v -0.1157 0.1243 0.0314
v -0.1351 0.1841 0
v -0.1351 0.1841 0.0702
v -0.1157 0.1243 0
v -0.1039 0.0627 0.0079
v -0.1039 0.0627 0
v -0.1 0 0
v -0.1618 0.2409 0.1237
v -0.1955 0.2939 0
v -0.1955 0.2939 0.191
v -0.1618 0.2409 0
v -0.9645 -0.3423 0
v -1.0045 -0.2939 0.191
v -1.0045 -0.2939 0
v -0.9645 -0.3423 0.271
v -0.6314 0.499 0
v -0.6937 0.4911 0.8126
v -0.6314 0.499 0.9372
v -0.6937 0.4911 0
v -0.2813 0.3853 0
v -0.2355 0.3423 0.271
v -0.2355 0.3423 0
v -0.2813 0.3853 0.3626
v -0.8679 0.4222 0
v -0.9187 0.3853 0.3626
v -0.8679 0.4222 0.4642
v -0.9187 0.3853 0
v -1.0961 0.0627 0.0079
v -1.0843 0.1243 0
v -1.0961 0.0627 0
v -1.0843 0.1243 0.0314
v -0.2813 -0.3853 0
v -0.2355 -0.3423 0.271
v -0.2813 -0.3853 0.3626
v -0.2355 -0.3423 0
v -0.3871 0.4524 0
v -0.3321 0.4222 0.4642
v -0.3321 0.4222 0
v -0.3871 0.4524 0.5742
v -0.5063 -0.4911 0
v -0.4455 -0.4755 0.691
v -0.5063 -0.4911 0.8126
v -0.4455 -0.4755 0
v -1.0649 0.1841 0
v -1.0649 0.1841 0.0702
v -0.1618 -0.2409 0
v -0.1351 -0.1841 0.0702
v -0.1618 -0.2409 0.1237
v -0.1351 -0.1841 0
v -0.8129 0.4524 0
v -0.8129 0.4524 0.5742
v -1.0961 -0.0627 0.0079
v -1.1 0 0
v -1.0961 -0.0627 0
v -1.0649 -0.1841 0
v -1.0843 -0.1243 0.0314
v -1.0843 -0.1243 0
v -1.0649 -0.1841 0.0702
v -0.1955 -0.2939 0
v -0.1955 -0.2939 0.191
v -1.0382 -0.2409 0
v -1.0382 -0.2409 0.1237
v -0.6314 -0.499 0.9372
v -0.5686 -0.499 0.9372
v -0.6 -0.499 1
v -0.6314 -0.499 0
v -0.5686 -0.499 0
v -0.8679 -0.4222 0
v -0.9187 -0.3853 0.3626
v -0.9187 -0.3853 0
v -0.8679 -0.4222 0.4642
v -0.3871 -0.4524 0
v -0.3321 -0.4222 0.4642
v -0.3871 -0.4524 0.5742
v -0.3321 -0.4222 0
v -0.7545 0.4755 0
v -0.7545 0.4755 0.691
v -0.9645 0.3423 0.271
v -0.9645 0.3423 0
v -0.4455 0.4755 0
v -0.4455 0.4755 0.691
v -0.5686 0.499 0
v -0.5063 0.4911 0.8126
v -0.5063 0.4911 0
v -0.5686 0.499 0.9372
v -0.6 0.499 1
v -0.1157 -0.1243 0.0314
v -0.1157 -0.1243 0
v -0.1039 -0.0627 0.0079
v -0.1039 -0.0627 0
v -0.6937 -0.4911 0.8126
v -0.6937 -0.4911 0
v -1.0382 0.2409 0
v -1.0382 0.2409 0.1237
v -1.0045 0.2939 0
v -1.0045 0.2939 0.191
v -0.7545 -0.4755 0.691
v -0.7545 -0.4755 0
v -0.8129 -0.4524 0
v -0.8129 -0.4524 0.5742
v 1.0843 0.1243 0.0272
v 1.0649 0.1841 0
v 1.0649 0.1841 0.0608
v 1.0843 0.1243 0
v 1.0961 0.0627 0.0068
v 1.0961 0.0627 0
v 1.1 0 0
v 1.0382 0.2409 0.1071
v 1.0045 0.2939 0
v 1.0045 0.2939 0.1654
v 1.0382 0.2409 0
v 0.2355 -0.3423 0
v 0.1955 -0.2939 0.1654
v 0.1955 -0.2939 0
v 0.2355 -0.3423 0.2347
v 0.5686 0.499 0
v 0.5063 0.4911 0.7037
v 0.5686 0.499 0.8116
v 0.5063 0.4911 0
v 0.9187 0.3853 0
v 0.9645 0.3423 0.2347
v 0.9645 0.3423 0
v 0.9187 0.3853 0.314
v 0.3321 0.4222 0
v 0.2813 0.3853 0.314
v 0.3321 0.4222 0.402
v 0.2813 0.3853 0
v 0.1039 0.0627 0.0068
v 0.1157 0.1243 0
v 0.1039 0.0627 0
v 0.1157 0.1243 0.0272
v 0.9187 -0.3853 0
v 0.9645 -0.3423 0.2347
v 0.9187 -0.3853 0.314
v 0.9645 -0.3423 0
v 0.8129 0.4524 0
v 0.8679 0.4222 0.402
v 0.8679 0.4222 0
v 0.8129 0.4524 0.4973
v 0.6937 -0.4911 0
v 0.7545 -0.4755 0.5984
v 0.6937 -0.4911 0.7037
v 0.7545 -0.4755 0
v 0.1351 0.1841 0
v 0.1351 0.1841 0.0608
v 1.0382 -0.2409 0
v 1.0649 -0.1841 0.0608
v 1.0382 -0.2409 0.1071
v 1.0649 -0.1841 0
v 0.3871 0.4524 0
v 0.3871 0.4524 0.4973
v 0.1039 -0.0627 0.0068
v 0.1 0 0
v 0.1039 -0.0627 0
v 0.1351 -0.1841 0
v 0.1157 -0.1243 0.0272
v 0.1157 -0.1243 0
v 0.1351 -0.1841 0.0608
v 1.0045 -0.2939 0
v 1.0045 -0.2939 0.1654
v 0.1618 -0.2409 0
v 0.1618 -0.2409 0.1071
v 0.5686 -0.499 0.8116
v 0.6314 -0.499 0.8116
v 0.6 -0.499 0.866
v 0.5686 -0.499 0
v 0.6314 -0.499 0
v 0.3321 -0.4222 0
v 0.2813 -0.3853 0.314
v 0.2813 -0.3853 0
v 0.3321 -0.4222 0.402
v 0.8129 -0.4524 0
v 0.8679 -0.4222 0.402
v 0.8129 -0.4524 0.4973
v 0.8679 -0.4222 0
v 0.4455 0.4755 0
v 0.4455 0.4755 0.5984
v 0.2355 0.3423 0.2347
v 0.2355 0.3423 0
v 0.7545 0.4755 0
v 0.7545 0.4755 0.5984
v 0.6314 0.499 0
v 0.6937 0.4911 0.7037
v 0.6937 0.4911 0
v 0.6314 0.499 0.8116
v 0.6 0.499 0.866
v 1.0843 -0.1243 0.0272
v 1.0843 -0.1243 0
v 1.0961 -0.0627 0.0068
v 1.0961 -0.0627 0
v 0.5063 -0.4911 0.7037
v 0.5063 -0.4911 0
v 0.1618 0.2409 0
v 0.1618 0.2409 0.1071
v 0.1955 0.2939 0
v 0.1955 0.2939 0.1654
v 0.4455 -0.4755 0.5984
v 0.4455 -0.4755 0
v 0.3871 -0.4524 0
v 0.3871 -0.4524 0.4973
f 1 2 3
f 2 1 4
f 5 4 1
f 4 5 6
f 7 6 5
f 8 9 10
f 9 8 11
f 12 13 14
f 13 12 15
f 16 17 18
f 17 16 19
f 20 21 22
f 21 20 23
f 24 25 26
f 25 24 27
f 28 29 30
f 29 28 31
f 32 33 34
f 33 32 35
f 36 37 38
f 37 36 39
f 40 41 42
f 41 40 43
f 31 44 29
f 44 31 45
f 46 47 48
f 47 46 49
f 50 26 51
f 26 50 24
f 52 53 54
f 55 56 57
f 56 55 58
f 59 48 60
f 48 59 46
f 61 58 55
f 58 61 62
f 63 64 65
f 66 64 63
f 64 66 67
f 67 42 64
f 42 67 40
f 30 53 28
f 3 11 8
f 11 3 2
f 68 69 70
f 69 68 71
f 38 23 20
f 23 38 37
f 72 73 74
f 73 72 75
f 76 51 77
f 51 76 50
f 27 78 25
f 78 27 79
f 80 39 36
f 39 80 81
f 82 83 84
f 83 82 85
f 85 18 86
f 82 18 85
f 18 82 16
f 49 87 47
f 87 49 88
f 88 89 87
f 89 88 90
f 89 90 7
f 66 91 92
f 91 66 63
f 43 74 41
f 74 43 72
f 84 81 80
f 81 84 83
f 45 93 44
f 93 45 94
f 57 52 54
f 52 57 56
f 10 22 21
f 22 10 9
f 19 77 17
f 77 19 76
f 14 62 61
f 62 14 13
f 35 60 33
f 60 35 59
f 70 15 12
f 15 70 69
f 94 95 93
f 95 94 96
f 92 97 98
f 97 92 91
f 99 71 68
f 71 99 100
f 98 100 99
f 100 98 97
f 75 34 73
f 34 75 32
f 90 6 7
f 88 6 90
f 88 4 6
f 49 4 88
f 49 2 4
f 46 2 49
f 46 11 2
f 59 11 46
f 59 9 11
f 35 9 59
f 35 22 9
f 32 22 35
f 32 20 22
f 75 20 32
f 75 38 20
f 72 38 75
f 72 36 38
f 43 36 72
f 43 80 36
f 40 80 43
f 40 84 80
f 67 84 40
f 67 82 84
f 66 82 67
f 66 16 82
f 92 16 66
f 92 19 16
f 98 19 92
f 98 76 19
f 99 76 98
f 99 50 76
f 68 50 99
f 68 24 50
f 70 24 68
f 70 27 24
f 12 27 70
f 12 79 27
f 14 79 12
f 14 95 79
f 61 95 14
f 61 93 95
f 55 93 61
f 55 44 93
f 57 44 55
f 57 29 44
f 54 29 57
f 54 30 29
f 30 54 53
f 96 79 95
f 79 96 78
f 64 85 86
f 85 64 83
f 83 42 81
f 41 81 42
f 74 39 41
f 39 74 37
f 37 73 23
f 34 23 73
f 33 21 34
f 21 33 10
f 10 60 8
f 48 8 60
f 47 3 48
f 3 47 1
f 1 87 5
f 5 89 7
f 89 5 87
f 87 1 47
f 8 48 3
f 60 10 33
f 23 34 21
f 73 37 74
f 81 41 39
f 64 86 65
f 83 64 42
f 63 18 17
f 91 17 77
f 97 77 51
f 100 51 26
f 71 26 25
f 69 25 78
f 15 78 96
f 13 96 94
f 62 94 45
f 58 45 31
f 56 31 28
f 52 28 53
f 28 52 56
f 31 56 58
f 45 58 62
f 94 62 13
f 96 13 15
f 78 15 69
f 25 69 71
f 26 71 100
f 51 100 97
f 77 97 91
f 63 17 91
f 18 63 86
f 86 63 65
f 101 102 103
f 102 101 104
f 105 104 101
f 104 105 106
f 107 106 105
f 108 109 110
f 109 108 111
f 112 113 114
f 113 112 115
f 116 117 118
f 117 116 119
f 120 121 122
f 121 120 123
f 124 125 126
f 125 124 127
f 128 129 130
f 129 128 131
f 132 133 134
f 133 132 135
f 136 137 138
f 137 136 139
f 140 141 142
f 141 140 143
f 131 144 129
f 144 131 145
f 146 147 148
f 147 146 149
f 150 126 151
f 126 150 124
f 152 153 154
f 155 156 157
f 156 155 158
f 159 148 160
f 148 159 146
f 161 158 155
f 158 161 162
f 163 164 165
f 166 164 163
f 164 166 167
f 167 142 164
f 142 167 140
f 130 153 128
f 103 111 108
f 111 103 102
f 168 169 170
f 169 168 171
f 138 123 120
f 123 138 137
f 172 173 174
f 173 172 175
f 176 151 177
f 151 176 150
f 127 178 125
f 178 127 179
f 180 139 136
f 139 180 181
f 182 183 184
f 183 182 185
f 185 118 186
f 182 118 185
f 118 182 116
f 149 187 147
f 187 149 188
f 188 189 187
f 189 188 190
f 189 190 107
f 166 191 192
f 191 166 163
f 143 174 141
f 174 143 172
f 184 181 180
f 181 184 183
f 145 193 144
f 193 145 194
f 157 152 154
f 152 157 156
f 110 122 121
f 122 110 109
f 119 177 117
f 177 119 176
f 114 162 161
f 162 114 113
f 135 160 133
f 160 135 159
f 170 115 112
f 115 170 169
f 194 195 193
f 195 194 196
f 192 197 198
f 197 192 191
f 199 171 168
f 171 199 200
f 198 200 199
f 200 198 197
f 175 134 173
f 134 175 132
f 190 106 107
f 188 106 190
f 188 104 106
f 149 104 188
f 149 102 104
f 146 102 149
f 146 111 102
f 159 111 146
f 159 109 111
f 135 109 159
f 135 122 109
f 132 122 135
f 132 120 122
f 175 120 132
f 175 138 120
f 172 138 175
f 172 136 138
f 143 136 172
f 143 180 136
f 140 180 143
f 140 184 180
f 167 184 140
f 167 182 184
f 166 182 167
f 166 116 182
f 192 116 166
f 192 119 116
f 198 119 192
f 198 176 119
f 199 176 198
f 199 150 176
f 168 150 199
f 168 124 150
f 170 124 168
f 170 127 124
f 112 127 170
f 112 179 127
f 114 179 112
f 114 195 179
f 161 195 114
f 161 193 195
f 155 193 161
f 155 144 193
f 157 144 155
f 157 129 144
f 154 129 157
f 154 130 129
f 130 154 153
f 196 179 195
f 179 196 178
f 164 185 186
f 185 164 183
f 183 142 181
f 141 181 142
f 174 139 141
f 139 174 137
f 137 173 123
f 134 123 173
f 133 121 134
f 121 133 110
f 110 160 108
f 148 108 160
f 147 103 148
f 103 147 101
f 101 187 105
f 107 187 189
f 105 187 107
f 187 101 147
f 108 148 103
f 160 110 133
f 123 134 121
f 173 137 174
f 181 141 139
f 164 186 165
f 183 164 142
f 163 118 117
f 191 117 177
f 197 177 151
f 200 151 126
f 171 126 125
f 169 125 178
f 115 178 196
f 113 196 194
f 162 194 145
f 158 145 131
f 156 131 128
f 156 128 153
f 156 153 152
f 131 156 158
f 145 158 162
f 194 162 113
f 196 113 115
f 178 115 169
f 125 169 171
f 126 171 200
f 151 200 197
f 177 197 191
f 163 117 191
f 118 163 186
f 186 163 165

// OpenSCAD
module unit_cylinder() {
	cylinder(
		h = 1,
		r1 = 0.5,
		r2 = 0.5,
		$fn = 50
	);
}

module isosceles_triangle() {
	polygon(
		points = [[-0.5, 0], [0.5, 0], [0, 1]],
		paths = [[0, 1, 2]]
	);
}

module equilateral_triangle() {
	polygon(
		points = [[-0.5, 0], [0.5, 0], [0, sqrt(3) / 2]],
		paths = [[0, 1, 2]]
	);
}

module isosceles_wedge() {
	translate([0, 0.5, 0]) {
		rotate([90, 0, 0]) {
			linear_extrude(height = 1) {
				isosceles_triangle();
			}
		}
	}
}

module equilateral_wedge() {
	translate([0, 0.5, 0]) {
		rotate([90, 0, 0]) {
			linear_extrude(height = 1) {
				equilateral_triangle();
			}
		}
	}
}

module isosceles_plug() {
	intersection() {
		unit_cylinder();
		isosceles_wedge();
	}
}

module equilateral_plug() {
	intersection() {
		unit_cylinder();
		equilateral_wedge();
	}
}

translate([-0.6, 0, 0]) {
	%equilateral_wedge();
	isosceles_plug();
}

translate([0.6, 0, 0]) {
	%unit_cylinder();
	equilateral_plug();
}
